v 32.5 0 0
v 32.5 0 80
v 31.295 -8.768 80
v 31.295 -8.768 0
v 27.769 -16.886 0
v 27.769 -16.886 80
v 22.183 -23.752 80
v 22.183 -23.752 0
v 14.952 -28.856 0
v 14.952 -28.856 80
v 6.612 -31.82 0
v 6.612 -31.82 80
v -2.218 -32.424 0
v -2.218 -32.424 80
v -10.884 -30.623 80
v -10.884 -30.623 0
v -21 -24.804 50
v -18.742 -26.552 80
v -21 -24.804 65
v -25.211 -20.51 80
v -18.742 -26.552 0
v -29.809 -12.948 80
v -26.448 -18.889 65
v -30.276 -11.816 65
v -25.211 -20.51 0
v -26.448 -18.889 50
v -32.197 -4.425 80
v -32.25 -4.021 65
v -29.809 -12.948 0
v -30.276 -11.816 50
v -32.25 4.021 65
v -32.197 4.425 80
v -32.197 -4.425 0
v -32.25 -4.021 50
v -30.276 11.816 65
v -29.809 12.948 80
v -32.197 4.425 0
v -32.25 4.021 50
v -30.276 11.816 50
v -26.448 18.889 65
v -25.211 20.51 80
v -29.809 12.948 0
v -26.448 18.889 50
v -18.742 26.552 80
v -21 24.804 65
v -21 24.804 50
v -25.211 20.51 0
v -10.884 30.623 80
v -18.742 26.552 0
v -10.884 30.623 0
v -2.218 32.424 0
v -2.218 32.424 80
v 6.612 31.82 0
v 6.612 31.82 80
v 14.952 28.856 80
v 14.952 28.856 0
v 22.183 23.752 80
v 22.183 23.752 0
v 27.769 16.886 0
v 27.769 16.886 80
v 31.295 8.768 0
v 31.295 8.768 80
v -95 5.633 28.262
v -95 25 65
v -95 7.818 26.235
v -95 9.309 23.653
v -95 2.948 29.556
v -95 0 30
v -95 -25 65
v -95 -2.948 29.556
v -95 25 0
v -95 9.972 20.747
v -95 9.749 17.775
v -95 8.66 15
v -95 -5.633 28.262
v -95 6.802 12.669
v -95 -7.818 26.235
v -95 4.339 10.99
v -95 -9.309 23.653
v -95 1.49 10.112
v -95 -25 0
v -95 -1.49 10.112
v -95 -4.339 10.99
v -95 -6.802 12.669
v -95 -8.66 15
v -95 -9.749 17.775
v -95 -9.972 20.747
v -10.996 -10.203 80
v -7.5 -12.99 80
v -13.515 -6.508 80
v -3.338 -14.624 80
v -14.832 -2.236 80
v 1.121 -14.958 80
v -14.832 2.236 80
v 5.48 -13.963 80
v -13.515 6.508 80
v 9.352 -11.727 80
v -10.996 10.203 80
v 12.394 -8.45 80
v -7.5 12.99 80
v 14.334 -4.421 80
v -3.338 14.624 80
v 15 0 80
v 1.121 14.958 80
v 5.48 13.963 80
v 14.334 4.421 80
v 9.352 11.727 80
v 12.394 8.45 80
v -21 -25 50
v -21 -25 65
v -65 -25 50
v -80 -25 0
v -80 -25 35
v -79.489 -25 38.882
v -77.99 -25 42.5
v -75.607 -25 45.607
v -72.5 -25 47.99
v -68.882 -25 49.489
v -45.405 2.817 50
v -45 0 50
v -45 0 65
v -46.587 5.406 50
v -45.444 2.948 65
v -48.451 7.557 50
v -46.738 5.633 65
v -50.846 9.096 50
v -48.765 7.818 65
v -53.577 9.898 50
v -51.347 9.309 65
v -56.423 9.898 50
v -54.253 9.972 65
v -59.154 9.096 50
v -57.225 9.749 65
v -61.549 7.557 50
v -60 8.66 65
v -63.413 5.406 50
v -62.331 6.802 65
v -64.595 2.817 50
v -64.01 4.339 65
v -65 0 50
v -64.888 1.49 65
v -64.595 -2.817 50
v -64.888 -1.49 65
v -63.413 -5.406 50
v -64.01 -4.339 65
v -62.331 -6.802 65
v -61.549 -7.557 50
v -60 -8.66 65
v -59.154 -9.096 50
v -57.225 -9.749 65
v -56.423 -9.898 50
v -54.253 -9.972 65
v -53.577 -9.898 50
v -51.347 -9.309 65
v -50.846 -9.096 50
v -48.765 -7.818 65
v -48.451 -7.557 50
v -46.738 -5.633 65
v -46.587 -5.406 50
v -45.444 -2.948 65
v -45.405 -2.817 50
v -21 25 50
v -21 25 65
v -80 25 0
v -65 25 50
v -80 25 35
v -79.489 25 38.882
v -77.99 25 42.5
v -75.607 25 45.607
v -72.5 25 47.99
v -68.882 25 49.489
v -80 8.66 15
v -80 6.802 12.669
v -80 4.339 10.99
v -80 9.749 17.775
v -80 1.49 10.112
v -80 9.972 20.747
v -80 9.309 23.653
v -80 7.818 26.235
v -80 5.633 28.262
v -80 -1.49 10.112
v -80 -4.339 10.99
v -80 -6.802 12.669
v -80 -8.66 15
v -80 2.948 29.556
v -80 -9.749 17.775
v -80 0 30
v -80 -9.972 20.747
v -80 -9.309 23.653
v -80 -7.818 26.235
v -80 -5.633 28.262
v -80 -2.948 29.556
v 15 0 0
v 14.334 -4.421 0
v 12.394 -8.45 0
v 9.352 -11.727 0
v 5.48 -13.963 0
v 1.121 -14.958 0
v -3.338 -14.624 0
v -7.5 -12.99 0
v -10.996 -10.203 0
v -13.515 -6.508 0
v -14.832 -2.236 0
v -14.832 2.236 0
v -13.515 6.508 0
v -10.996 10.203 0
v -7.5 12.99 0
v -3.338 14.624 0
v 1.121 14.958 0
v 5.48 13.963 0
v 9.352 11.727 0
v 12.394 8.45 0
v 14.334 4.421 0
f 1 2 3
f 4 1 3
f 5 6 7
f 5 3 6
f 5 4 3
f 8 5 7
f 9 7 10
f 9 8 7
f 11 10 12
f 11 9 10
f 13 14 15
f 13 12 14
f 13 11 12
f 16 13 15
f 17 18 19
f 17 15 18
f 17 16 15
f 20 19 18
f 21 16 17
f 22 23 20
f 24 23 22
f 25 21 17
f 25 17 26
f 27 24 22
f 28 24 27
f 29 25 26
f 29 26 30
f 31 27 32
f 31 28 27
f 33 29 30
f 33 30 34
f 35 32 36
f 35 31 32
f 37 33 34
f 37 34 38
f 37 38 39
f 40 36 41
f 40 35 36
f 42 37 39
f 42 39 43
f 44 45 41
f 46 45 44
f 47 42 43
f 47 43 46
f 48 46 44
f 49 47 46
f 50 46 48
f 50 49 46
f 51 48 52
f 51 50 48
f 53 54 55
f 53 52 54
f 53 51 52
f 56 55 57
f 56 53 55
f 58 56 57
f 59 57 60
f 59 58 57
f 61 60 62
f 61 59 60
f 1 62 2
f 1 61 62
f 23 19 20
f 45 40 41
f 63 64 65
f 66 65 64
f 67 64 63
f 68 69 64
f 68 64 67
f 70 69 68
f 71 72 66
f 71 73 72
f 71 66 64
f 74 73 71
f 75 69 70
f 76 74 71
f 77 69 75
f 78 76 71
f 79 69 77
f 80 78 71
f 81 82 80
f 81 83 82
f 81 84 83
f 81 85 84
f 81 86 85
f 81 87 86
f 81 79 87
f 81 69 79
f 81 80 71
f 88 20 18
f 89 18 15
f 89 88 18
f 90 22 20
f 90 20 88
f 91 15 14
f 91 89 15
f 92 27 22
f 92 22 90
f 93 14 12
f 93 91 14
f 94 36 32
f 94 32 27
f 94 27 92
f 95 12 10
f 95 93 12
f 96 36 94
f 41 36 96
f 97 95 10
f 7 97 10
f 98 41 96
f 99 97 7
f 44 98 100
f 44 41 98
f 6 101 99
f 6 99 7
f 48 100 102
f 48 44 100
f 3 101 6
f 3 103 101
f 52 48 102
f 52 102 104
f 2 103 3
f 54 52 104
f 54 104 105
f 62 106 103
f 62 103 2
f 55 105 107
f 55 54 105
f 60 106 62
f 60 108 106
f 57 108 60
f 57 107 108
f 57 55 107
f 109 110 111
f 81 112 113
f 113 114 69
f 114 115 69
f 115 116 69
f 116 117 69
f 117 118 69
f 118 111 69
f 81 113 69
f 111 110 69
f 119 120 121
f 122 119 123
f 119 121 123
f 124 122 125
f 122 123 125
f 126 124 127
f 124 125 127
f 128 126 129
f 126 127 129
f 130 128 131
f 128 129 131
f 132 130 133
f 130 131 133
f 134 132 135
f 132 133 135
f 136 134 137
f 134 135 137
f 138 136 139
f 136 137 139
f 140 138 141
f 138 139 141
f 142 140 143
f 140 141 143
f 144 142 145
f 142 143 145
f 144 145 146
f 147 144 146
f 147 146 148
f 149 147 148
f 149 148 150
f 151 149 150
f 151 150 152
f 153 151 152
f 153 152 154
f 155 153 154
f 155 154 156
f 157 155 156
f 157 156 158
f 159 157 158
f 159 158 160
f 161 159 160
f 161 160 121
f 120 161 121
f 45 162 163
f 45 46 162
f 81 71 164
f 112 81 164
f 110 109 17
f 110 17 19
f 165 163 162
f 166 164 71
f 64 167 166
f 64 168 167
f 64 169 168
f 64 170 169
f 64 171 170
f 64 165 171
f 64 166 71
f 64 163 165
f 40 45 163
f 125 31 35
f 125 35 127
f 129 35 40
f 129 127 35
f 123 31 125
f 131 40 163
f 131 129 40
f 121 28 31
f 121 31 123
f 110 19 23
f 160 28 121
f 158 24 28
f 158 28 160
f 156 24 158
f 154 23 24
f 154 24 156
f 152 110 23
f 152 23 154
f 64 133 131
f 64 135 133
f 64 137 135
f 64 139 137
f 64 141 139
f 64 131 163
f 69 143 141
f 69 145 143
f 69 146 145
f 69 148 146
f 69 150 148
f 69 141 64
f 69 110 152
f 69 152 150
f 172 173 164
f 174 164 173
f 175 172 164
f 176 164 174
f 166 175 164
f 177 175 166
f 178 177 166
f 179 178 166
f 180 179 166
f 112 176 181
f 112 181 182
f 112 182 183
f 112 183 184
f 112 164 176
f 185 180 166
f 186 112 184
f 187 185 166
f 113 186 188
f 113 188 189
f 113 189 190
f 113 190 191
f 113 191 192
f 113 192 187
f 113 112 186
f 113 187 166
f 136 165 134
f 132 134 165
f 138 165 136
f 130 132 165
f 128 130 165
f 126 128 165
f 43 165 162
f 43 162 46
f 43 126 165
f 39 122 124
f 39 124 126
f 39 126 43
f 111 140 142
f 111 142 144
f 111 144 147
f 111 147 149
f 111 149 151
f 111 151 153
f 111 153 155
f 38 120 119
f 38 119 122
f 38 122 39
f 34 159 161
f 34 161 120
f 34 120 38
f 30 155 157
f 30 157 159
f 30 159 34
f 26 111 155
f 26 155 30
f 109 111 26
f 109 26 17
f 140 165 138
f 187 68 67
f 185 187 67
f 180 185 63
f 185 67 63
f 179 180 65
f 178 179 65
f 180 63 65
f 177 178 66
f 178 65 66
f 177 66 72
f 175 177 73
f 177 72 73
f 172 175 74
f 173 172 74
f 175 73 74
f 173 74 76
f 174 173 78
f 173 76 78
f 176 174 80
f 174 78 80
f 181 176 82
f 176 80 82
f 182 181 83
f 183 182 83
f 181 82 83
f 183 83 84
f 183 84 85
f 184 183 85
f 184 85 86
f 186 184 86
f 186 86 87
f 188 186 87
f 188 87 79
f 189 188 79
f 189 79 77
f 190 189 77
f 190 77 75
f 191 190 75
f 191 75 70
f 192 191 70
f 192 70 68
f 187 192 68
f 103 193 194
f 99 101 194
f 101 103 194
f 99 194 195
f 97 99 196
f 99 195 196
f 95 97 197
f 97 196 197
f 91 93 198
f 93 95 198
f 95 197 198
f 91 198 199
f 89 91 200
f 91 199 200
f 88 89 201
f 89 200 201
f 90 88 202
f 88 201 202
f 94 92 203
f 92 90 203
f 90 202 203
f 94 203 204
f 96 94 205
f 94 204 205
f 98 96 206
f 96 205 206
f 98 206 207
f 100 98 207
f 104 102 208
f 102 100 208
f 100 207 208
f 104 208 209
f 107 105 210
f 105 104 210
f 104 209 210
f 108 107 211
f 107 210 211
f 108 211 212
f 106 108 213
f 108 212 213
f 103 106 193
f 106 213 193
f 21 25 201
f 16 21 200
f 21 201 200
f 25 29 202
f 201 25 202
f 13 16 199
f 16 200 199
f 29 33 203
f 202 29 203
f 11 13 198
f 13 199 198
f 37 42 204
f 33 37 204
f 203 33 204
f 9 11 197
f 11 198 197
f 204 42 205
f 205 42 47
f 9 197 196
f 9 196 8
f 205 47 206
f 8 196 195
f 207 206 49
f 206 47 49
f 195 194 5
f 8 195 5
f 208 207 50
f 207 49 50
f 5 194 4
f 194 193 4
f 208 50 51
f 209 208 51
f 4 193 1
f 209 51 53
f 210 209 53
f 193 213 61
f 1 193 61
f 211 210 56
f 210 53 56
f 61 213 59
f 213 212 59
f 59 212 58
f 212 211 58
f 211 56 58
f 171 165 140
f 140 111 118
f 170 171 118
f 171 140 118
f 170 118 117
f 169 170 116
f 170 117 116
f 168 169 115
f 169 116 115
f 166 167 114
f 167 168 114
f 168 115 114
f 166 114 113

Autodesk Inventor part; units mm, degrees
ref_plane "YZ Plane" through (0, 0, 0) normal (1, 0, 0) x (0, 1, 0)
sketch "Szkic1" plane through (0, 0, 0) normal (0, 0, 1) x (1, 0, 0)
  circle A0 centre (0, 0) radius 15
  circle A1 centre (0, 0) radius 32.5
  dimension "d0" = 65
  dimension "d1" = 30
extrude "Wyciągnięcie proste1" add sketch "Szkic1" along normal blind 80
sketch "Szkic2" plane through (0, 0, 0) normal (0, 1, 0) x (-1, 0, 0)
  point P0 (0, 0)
ref_plane "Płaszczyzna konstrukcyjna2" through (0, 32.5, 0) normal (0, 1, 0) x (-1, 0, 0)
sketch "Szkic3" plane through (0, 32.5, 0) normal (0, 1, 0) x (-1, 0, 0)
  line L0 (32.5, 80) -> (-32.5, 80) projected
  line L1 (32.5, 0) -> (-32.5, 0) projected
  line L2 (32.5, 0) -> (32.5, 80) projected
  line L3 (32.5, 0) -> (-32.5, 0) projected
  line L4 (-32.5, 0) -> (-32.5, 80) projected
  line L5 (21, 65) -> (95, 65)
  line L6 (95, 65) -> (95, 0)
  line L7 (95, 0) -> (80, 0)
  line L8 (80, 0) -> (80, 35)
  line L9 (65, 50) -> (21, 50)
  line L10 (21, 50) -> (21, 65)
  arc A0 (80, 35) -> (65, 50) centre (65, 35) ccw
  line L11 (0, 80) -> (0, 0) construction
  dimension "d4" = 15
  dimension "d8" = 15
  dimension "d10" = 65
  dimension "d11" = 65
  dimension "d12" = 95
  dimension "d15" = 15
ref_plane "Płaszczyzna konstrukcyjna3" through (0, 16.25, 0) normal (0, 1, 0) x (-1, 0, 0)
sketch "Szkic4" plane through (0, 0, 0) normal (0, 1, 0) x (-1, 0, 0)
  line L0 (21, 65) -> (95, 65) projected
  line L1 (21, 50) -> (21, 65) projected
  line L2 (65, 50) -> (21, 50) projected
  arc A0 (80, 35) -> (65, 50) centre (65, 35) ccw projected
  line L3 (80, 0) -> (80, 35) projected
  line L4 (95, 65) -> (95, 0) projected
  line L5 (95, 0) -> (80, 0) projected
  point P0 (0, 0)
extrude "Wyciągnięcie proste2" add sketch "Szkic4" along normal mid plane 50
sketch "Szkic5" plane through (-95, -25, 65) normal (-1, 0, 0) x (0, 0, 1)
  circle A0 centre (-45, 25) radius 10
  line L0 (-65, 0) -> (-65, 50) projected
  point P0 (-65, 25)
  dimension "d16" = 20
  dimension "d17" = 20
extrude "Wyciągnięcie proste3" cut sketch "Szkic5" against normal blind 50
sketch "Szkic6" plane through (-95, 25, 65) normal (0, 0, 1) x (1, 0, 0)
  circle A0 centre (40, -25) radius 10
  point P0 (95, -25)
  dimension "d20" = 20
  dimension "d21" = 55
extrude "Wyciągnięcie proste4" cut sketch "Szkic6" against normal blind 50
properties part number "Bartosz_Zukowski_model_nr_10"
